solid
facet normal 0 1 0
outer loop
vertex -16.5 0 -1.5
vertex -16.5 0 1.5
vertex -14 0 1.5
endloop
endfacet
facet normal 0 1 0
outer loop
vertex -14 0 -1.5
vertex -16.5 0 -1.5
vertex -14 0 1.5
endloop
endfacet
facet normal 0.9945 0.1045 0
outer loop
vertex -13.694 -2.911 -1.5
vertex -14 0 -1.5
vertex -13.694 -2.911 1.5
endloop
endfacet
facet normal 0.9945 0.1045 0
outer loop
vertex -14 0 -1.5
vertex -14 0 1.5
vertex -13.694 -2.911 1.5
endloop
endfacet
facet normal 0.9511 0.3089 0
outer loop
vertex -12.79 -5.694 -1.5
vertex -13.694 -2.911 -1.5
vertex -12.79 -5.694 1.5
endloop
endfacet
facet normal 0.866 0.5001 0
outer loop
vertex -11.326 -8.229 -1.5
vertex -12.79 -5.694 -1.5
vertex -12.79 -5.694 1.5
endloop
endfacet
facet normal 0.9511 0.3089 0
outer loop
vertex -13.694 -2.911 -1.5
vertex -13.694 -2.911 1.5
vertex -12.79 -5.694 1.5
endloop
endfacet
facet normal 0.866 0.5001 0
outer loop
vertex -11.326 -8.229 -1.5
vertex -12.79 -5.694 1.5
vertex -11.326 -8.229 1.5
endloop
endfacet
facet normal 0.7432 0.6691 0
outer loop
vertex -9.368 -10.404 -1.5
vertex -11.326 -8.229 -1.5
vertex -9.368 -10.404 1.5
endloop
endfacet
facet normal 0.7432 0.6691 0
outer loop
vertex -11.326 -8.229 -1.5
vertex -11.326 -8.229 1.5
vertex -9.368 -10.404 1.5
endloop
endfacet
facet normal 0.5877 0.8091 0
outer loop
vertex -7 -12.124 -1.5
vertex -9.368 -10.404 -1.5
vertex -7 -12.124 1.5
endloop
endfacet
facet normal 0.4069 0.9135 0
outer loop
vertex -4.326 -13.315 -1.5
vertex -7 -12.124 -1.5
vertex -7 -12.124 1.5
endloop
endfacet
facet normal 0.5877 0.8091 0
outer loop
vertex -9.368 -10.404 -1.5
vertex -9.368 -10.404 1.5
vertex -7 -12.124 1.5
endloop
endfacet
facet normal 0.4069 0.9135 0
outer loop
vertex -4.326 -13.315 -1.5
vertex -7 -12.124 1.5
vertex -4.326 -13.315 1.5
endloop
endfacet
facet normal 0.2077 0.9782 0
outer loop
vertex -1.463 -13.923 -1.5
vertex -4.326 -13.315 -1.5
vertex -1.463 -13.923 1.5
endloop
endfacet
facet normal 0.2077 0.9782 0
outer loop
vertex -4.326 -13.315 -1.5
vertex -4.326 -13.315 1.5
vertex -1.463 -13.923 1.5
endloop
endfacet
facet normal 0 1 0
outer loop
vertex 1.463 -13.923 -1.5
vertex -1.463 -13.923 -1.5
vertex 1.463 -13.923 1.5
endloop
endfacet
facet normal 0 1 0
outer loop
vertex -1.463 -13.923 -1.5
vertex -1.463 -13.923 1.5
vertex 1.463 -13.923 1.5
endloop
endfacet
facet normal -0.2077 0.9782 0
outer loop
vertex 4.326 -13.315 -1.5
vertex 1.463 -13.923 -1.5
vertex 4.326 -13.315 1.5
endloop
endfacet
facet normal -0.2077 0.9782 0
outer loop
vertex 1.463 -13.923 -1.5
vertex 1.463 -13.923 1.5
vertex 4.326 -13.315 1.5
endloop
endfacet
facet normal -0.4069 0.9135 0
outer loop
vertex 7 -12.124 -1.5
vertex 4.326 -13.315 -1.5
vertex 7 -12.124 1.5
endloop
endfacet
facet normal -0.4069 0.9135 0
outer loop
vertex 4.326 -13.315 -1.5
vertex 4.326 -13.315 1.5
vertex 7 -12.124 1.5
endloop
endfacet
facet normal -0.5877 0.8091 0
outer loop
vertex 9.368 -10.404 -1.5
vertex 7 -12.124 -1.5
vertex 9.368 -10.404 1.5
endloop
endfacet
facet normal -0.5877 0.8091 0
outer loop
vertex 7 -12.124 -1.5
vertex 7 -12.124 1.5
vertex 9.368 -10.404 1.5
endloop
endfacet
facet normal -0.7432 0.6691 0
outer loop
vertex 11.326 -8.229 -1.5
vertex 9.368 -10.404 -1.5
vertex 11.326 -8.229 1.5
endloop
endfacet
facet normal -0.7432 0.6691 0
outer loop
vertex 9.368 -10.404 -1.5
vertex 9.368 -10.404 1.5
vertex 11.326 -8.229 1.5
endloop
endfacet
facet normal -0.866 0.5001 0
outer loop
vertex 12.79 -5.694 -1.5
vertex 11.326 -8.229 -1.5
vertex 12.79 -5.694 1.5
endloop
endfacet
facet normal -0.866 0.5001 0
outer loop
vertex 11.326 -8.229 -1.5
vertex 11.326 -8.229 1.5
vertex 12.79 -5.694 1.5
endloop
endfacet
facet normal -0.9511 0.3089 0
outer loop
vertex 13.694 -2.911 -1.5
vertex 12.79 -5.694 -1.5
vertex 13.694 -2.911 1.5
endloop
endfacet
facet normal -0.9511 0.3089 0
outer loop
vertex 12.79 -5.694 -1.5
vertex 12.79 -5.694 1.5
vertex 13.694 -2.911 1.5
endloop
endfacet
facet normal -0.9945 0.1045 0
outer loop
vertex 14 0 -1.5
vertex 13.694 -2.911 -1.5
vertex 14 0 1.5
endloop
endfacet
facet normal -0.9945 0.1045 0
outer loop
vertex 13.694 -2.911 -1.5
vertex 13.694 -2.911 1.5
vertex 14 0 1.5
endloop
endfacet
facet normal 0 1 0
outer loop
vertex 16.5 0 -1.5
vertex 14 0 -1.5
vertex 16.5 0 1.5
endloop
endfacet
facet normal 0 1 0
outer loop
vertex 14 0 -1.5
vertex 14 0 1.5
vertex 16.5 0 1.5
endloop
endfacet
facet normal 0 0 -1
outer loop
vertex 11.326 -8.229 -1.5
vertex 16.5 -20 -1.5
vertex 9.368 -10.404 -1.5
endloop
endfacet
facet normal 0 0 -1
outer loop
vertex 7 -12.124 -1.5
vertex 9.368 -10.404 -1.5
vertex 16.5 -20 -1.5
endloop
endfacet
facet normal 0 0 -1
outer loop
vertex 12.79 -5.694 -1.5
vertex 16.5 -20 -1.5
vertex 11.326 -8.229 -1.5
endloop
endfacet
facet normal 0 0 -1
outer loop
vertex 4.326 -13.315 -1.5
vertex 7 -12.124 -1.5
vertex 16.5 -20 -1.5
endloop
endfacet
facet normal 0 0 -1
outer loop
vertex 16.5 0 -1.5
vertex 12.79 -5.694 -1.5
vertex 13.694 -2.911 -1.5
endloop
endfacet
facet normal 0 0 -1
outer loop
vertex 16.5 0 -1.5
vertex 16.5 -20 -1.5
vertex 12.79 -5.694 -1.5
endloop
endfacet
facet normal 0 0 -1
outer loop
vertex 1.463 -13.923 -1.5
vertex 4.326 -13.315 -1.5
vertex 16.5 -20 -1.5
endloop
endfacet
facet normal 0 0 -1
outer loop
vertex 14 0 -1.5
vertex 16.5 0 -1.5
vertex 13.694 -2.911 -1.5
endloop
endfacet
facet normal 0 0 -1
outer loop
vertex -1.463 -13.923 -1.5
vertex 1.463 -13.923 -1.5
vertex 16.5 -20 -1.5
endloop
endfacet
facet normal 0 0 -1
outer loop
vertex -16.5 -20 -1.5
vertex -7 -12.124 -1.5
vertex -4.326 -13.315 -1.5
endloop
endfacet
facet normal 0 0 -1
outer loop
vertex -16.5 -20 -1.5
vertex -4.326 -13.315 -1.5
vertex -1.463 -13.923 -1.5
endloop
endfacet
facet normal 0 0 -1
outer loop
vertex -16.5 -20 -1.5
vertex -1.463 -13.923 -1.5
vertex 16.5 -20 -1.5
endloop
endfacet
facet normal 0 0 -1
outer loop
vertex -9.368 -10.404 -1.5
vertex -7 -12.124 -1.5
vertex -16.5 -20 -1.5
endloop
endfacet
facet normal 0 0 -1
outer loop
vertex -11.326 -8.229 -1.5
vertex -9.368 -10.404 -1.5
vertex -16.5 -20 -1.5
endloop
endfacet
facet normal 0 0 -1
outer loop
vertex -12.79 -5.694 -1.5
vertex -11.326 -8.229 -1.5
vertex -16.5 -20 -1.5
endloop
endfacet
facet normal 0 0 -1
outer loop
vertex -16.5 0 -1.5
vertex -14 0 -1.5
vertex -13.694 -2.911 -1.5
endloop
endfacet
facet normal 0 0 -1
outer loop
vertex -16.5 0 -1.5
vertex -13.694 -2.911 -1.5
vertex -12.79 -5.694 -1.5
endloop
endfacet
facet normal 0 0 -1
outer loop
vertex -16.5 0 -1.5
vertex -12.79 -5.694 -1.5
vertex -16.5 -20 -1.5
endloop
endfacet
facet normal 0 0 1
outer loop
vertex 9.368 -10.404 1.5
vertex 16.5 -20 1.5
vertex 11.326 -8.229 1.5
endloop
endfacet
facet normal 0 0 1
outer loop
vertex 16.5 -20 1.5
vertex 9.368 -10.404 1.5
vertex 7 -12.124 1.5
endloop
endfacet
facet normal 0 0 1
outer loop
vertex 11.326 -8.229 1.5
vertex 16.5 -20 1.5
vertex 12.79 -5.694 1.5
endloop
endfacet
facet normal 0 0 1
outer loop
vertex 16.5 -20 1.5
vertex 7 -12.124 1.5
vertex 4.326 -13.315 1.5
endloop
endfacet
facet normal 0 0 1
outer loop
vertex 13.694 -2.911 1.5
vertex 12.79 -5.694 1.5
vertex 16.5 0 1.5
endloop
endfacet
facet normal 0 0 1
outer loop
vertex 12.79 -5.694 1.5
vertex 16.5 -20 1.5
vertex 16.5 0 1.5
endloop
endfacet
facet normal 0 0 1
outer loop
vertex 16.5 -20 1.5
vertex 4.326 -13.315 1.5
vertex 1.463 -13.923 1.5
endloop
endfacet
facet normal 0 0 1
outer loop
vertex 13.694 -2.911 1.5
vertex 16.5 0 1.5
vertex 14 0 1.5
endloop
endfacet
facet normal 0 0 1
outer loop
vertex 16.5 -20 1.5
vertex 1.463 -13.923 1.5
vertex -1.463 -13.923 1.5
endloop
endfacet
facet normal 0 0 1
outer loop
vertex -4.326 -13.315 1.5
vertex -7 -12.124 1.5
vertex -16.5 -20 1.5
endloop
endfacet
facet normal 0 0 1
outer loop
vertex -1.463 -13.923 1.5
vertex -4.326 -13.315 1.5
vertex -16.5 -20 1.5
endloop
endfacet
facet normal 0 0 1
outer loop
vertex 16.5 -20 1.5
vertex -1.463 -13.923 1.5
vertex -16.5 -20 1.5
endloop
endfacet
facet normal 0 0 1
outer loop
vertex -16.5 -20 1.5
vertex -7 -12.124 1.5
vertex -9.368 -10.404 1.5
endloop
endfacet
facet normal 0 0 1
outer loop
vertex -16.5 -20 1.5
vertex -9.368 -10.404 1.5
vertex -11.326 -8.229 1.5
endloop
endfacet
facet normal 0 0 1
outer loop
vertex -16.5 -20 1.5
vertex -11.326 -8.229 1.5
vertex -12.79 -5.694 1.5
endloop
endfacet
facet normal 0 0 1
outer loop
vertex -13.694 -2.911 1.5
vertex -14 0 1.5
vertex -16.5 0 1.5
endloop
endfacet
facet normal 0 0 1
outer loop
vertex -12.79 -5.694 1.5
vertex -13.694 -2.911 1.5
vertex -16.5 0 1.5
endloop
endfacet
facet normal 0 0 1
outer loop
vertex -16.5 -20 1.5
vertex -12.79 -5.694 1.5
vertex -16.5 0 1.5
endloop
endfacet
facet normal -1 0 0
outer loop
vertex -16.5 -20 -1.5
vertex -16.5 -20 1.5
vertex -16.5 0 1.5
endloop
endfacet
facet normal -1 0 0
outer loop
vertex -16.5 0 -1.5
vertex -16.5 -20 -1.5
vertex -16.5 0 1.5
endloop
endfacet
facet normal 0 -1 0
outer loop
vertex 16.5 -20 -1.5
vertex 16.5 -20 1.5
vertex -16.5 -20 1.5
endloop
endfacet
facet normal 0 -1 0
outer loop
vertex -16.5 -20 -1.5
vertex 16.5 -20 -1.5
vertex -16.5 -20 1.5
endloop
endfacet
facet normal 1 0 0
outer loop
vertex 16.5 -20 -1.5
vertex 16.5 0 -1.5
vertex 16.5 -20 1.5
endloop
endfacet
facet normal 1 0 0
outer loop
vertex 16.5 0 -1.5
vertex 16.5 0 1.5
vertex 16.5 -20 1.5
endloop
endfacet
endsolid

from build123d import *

# Parameters (mm, degrees)
BOSS_EXTRUDE1_DEPTH = 1.5


with BuildPart() as part:
    # Sketch1 → Boss-Extrude1 (new, symmetric)
    with BuildSketch(Plane.XY):
        with BuildLine():
            Line((-16.5, 0), (-14, 0))
            ThreePointArc((-14, 0), (0, -14), (14, 0))
            Line((14, 0), (16.5, 0))
            Line((16.5, 0), (16.5, -20))
            Line((16.5, -20), (-16.5, -20))
            Line((-16.5, -20), (-16.5, 0))
        make_face()
    extrude(amount=BOSS_EXTRUDE1_DEPTH, both=True)


solid = part.part
